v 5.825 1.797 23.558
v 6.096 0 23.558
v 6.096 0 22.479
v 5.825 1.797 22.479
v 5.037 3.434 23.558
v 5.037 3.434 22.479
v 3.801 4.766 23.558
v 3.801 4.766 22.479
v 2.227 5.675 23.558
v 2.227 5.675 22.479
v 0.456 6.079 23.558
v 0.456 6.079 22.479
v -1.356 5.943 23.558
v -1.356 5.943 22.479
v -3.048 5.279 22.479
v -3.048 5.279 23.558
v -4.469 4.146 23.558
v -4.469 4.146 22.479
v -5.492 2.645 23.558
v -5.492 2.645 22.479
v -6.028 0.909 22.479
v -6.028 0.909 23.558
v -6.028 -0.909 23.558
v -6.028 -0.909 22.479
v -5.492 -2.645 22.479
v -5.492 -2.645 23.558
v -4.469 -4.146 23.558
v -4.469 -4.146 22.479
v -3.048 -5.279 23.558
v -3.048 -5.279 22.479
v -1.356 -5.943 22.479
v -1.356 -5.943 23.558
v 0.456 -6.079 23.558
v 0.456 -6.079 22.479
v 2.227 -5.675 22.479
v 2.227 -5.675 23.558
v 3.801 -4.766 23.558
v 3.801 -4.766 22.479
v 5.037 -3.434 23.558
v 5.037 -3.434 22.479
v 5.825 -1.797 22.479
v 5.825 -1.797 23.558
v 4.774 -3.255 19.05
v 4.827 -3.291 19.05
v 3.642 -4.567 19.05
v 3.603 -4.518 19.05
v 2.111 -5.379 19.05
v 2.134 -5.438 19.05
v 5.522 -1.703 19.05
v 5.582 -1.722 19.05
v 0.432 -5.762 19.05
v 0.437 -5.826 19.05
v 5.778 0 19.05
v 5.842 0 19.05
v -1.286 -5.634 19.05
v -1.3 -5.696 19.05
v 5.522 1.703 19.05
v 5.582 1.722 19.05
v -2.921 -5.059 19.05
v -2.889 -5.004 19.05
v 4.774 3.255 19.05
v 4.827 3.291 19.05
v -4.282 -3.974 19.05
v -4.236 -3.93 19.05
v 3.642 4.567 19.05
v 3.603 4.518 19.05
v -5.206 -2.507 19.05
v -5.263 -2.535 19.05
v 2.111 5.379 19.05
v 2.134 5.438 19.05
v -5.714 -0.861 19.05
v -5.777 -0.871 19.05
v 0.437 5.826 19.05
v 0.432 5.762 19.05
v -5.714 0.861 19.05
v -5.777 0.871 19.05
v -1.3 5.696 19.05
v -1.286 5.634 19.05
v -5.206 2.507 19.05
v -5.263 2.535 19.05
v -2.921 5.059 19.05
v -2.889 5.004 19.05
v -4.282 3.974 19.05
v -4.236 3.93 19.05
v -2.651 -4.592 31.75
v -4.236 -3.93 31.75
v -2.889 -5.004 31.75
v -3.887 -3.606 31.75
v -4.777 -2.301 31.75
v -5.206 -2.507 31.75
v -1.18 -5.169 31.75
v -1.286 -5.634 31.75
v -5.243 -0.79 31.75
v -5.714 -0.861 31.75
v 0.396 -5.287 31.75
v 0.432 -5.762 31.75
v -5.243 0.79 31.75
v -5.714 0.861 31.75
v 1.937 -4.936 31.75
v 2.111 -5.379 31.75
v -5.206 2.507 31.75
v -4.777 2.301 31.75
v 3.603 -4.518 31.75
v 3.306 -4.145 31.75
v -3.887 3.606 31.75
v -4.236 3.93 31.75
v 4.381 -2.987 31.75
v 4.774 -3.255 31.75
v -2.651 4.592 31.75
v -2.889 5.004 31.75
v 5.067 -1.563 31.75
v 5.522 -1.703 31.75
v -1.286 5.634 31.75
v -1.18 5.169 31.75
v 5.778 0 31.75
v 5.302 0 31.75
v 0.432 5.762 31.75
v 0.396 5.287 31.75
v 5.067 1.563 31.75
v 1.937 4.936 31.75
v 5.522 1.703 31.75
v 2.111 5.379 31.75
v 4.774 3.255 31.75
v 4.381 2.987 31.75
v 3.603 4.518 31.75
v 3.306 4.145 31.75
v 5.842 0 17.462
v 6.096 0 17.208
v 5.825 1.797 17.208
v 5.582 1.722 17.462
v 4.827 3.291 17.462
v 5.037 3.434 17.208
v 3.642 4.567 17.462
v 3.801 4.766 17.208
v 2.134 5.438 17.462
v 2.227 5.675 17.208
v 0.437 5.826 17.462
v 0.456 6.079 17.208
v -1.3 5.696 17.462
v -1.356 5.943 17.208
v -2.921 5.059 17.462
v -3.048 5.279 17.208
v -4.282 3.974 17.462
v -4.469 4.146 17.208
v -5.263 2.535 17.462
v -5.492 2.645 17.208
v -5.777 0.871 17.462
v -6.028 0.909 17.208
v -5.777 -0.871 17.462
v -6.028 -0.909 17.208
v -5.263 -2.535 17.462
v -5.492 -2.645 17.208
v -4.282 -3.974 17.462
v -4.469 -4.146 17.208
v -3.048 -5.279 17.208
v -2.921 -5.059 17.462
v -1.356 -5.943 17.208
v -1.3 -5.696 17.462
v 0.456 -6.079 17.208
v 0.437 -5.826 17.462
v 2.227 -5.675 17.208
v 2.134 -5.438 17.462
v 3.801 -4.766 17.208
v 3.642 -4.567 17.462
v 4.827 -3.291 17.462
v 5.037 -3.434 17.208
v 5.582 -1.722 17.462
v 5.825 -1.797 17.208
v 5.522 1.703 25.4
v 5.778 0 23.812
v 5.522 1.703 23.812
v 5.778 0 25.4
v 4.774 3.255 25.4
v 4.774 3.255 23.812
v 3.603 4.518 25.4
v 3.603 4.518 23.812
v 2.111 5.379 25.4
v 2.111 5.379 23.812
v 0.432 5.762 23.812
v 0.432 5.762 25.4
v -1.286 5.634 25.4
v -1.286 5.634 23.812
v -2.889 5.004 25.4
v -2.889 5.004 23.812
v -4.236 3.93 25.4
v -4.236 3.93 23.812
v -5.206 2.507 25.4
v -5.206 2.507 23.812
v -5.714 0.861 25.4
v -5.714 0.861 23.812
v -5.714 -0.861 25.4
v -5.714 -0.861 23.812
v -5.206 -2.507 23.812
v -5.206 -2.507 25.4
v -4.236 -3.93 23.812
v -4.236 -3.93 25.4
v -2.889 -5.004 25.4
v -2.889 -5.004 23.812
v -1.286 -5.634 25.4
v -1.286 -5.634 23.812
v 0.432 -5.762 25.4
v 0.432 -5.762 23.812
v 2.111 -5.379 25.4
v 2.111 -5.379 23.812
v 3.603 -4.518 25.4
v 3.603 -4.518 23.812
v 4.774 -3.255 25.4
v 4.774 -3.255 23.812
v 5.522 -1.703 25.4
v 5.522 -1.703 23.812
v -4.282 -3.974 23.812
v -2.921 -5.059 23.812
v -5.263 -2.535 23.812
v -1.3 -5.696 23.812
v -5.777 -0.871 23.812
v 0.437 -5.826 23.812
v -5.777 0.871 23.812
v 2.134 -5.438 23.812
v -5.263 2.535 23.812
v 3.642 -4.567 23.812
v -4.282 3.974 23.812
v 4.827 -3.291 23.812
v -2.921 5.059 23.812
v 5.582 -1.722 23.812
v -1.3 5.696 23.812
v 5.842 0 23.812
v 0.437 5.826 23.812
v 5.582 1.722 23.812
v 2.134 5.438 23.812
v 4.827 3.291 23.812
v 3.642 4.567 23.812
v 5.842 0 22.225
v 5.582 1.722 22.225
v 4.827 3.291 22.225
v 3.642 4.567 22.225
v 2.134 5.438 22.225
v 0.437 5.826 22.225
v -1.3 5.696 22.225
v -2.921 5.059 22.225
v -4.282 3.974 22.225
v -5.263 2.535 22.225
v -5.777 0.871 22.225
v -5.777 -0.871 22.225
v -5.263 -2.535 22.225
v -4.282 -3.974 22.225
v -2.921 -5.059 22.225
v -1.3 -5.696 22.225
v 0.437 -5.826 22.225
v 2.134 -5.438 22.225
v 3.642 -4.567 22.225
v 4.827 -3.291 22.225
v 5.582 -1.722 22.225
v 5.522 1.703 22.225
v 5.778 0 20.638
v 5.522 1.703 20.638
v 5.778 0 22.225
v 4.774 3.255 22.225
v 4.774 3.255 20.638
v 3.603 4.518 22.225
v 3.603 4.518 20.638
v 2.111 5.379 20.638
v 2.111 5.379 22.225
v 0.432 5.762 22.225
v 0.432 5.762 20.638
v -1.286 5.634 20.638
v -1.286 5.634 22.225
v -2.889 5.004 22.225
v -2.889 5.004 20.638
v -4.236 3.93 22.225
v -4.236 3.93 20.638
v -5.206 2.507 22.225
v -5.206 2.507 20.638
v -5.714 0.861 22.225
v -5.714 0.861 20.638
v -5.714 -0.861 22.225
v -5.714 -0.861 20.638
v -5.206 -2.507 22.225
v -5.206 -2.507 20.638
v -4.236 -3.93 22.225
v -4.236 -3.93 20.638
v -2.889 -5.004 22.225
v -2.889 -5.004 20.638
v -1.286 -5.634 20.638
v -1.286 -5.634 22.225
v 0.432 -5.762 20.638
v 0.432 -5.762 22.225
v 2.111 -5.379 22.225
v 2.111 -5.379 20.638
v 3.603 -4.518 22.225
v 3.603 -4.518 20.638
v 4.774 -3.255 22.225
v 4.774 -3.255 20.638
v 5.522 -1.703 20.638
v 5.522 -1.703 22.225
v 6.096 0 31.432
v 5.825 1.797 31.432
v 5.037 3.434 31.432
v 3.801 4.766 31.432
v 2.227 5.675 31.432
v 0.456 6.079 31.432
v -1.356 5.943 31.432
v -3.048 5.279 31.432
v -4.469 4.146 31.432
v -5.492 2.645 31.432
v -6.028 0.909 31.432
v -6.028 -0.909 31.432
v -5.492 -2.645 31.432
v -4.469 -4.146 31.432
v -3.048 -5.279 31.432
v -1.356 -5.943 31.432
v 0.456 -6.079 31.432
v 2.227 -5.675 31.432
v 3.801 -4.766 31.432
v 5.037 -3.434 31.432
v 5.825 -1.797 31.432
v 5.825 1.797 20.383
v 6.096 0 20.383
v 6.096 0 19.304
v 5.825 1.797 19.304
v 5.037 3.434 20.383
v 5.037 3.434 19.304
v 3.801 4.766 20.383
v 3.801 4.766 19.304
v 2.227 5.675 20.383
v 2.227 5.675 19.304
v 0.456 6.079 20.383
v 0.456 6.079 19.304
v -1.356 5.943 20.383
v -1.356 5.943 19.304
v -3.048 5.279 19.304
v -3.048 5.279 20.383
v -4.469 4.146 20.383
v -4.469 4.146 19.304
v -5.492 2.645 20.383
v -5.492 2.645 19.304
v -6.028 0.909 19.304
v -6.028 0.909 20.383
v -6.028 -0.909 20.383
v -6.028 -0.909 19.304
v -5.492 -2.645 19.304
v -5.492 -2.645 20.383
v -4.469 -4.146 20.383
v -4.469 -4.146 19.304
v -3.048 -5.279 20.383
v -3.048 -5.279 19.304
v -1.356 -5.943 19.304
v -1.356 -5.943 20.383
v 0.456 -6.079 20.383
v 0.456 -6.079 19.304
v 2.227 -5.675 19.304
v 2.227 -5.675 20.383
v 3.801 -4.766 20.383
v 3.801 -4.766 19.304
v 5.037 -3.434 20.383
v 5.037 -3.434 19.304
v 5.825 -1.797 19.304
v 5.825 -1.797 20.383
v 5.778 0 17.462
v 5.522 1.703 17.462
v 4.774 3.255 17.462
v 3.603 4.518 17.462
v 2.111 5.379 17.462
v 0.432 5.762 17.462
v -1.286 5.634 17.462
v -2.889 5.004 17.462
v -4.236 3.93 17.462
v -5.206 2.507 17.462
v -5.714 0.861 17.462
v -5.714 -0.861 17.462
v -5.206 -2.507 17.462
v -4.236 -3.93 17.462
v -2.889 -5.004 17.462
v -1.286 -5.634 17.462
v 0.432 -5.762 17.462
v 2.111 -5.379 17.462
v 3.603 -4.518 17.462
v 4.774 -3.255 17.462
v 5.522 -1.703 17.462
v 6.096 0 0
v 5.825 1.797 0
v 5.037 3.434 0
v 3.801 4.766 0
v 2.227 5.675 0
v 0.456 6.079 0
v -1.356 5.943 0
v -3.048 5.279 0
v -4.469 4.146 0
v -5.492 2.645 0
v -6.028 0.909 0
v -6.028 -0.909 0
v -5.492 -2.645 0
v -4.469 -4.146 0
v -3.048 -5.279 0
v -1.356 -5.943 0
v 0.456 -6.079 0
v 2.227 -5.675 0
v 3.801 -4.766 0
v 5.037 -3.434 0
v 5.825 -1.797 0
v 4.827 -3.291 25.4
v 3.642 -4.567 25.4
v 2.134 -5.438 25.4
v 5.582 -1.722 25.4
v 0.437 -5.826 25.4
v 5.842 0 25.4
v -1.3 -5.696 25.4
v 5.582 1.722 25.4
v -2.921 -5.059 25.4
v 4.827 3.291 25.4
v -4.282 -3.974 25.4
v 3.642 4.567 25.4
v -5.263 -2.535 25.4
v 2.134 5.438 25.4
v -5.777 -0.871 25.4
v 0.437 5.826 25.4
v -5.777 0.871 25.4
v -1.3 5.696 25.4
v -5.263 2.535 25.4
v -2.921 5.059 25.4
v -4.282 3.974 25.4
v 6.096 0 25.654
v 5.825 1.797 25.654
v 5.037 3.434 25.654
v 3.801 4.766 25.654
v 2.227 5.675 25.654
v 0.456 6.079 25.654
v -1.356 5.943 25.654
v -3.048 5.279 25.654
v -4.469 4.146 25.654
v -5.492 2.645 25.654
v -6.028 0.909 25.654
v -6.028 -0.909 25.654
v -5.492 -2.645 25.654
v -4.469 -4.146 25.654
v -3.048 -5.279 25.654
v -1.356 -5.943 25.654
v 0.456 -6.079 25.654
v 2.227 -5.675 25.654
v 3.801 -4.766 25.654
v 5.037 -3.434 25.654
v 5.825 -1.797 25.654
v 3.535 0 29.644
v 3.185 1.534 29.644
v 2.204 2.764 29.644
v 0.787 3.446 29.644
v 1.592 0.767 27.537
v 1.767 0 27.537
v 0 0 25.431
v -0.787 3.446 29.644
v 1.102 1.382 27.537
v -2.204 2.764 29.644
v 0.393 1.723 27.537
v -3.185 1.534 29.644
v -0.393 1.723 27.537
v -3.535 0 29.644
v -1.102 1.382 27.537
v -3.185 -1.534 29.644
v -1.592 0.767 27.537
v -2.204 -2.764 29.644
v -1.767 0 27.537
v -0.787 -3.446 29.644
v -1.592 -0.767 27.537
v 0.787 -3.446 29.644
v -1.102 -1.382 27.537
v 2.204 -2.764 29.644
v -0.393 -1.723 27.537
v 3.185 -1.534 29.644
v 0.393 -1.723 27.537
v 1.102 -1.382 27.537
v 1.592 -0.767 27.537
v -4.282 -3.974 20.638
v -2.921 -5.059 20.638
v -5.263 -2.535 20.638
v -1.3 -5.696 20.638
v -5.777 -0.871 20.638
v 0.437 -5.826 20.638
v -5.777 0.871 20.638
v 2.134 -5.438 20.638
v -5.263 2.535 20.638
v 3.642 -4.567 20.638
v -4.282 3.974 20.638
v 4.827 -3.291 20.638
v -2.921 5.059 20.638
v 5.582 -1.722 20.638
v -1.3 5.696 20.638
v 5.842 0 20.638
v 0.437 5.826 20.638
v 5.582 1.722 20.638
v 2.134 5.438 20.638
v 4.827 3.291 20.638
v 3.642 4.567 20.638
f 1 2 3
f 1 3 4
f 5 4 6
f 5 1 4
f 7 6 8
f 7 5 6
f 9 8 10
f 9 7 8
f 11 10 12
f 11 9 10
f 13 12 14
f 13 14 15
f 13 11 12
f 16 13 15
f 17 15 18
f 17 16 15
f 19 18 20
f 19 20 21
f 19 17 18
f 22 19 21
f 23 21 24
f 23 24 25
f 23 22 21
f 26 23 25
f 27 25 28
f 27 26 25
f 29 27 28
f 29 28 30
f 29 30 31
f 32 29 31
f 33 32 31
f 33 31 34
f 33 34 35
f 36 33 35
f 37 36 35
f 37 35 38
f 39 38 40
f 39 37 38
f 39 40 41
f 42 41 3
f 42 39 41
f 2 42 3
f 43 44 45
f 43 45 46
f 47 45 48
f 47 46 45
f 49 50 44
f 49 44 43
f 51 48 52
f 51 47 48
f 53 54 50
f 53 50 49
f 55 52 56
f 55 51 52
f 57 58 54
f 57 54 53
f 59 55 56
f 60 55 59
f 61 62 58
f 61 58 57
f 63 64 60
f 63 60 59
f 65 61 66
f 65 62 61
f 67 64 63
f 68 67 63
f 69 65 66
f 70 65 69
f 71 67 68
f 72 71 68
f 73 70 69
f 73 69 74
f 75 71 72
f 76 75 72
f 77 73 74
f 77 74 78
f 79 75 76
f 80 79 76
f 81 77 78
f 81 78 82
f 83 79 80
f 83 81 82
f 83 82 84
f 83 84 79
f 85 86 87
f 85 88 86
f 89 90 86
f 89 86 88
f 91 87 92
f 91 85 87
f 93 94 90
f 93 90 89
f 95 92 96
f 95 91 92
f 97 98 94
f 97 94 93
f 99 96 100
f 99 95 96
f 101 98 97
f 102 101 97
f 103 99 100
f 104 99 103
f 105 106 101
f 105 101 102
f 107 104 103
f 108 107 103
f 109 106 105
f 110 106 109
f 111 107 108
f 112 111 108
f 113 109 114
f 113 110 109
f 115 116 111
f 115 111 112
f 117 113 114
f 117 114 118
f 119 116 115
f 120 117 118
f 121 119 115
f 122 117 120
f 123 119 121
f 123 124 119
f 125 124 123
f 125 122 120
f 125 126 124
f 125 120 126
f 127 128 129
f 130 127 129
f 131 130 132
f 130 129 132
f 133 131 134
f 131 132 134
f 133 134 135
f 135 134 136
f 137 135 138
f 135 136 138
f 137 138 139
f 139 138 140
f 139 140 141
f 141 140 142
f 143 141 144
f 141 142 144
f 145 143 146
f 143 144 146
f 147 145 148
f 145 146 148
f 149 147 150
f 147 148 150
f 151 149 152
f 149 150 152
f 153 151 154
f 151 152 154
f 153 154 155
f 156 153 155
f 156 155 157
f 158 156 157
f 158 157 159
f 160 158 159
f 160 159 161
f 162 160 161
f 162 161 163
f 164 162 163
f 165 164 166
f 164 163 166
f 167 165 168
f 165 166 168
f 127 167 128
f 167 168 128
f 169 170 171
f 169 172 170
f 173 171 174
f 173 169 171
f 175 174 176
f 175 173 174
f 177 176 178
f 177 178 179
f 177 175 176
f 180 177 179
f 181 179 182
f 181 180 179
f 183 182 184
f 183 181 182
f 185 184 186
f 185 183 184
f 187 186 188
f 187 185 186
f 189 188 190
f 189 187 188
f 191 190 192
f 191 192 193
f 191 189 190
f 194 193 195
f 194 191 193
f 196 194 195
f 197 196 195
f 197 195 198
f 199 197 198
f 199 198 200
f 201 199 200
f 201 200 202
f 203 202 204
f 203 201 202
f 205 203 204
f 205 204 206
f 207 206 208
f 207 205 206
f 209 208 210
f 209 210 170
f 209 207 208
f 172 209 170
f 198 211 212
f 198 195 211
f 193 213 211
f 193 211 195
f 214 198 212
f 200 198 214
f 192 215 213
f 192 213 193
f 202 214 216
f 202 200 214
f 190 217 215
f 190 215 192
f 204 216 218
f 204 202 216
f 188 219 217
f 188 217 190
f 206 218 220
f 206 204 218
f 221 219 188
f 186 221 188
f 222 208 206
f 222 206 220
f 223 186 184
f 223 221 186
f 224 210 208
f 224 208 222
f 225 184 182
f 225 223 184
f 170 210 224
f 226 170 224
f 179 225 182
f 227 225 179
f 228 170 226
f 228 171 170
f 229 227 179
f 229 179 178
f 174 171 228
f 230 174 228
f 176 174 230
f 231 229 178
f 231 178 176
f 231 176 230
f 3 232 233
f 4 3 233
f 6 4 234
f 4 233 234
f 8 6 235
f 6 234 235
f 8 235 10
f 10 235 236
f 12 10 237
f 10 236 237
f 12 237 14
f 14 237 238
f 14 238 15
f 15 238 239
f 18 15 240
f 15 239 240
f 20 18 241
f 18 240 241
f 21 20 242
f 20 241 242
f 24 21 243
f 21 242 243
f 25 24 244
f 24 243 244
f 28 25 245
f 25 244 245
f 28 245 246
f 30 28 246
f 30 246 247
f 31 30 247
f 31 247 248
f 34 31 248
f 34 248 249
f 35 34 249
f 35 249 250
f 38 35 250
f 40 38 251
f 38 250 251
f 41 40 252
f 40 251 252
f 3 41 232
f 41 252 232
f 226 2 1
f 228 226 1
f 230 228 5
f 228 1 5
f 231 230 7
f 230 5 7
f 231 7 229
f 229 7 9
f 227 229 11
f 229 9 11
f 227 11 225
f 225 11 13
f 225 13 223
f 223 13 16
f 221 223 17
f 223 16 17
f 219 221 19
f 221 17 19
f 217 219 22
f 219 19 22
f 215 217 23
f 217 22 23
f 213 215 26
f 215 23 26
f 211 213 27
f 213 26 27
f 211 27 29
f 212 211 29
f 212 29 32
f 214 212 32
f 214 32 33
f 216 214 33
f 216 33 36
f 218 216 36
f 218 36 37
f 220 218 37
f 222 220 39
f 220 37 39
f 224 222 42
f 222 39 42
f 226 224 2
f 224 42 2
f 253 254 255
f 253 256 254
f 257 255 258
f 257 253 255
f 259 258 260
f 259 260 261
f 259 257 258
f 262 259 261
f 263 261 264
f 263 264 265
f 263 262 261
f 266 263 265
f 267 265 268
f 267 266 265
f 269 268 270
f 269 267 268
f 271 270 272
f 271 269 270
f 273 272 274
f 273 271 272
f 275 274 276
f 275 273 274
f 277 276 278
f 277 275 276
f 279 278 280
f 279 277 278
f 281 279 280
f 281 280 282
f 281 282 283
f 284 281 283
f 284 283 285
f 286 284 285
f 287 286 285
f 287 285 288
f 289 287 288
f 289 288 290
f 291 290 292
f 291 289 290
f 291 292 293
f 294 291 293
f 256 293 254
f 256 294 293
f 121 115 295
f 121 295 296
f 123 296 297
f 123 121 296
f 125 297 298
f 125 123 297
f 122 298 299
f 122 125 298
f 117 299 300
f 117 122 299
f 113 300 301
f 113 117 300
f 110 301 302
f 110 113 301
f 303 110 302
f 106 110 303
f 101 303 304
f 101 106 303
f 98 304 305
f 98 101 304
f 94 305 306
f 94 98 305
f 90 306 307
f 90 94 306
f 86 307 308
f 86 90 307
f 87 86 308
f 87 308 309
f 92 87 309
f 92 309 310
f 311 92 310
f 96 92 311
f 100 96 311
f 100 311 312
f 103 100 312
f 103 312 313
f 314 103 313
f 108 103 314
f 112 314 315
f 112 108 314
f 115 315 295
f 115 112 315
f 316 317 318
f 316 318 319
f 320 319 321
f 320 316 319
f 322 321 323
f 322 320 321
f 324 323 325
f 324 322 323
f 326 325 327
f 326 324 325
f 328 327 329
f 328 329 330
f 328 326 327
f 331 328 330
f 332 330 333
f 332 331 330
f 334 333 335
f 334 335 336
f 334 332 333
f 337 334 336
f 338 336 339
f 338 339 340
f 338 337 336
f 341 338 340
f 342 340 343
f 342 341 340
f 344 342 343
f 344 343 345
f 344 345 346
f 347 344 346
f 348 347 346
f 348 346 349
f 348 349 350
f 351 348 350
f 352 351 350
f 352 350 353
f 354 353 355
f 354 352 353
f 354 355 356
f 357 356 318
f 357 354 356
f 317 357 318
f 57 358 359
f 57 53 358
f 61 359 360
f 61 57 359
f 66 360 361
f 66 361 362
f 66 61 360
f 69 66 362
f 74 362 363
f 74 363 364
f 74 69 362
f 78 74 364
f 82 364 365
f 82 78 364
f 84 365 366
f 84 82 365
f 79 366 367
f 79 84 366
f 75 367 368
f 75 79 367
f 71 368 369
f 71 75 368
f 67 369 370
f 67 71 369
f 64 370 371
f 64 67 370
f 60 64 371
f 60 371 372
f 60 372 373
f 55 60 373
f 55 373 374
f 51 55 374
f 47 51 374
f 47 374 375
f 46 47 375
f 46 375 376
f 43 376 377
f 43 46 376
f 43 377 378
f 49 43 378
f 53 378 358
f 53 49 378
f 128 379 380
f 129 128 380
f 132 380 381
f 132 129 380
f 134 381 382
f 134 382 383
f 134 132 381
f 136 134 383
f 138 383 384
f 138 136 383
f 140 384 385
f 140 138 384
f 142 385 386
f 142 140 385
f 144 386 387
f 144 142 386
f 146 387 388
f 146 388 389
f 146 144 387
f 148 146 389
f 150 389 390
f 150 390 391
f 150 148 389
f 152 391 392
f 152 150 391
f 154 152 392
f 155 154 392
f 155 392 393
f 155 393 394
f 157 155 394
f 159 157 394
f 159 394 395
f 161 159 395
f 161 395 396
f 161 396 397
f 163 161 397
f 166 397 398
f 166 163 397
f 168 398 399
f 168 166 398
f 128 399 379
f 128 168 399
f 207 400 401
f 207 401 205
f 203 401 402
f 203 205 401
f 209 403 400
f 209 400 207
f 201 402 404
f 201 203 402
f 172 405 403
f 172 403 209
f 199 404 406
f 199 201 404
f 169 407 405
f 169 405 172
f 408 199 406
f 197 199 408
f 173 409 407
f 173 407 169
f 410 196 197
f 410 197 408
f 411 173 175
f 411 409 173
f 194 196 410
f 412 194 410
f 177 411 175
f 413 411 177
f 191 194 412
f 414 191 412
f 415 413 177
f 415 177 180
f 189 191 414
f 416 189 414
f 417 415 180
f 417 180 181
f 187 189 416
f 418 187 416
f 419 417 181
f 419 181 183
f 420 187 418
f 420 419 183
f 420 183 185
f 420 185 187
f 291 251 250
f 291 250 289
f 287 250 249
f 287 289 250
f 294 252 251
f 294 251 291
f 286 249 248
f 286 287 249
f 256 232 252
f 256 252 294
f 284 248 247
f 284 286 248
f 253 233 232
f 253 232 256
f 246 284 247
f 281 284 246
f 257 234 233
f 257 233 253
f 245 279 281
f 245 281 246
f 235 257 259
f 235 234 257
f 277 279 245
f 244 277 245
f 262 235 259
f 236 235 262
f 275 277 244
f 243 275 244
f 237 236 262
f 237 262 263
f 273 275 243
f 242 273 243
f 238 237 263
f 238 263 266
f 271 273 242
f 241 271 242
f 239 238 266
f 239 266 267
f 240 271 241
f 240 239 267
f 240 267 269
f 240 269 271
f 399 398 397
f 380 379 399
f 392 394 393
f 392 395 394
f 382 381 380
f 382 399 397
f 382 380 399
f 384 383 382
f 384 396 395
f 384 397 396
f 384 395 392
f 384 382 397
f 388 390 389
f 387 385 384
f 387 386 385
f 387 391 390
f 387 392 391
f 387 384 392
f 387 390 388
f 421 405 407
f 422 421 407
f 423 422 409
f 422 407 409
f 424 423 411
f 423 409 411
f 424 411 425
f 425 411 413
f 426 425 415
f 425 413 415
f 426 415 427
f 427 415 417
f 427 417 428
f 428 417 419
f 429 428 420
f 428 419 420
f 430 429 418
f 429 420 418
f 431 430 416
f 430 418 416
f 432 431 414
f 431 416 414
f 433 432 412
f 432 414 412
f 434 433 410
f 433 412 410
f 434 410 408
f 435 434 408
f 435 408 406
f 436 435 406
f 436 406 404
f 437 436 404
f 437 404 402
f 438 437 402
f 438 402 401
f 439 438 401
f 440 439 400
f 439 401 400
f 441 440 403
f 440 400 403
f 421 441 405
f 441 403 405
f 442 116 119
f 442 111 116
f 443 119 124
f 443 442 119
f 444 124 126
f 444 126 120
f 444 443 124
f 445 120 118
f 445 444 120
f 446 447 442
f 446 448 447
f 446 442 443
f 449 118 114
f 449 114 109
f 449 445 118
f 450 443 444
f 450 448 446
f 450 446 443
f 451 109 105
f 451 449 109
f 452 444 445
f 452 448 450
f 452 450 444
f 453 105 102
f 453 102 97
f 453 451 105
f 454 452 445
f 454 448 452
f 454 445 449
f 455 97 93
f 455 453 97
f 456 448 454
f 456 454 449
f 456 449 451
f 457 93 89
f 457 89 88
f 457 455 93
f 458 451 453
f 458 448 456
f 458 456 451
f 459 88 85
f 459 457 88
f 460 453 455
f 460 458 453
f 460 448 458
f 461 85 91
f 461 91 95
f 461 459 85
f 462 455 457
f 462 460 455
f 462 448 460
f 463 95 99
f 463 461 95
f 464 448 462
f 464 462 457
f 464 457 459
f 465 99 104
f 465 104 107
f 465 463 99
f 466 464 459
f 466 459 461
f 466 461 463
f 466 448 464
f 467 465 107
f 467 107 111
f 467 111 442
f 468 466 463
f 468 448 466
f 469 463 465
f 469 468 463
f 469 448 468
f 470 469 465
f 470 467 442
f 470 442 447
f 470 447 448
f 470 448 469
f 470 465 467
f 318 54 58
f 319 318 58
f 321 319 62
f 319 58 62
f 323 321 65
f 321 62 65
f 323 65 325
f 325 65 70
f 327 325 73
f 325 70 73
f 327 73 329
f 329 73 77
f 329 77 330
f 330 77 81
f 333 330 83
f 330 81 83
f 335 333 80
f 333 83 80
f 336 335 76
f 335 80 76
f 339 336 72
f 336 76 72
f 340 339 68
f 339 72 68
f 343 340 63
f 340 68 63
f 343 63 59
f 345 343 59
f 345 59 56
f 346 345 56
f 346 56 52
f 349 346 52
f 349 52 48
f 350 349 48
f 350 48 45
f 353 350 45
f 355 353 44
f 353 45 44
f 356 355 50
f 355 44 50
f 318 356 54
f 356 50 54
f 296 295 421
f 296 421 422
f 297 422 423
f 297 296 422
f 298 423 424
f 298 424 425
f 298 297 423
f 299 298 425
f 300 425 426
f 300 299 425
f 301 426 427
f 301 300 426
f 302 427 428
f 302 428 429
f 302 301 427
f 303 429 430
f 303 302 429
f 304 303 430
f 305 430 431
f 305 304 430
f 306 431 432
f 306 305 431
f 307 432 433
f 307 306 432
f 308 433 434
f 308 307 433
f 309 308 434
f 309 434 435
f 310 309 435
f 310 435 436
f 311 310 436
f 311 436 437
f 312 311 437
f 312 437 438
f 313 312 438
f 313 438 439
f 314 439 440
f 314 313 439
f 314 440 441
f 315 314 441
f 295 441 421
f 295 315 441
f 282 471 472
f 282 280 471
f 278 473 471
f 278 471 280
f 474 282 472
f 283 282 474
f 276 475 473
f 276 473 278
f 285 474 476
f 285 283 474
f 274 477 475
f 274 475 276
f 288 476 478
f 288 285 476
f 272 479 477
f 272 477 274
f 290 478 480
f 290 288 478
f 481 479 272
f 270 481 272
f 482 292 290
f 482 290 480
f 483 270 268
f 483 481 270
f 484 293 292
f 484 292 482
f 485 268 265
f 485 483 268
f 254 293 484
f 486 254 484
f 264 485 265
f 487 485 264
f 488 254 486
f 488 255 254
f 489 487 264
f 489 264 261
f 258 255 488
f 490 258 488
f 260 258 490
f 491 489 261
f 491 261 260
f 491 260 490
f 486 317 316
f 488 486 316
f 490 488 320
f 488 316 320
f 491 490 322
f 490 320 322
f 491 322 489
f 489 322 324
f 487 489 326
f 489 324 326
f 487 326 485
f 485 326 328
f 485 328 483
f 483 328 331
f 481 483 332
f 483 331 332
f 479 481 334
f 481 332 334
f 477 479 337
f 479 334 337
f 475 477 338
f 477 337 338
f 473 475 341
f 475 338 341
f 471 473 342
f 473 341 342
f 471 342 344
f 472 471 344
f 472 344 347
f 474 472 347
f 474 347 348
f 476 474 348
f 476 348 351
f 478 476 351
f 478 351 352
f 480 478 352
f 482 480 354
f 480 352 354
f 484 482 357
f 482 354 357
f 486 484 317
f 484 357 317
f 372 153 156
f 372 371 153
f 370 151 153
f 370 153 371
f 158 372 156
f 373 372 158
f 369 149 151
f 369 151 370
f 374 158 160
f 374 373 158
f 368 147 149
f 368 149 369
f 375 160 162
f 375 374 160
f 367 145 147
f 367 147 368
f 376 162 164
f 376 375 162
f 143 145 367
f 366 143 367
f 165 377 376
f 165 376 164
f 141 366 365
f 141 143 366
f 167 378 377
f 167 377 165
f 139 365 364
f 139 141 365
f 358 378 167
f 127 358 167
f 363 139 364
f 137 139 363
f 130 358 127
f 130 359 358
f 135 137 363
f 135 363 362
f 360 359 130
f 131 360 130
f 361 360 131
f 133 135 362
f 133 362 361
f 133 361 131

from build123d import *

# Parameters (mm, degrees)
F2_SIZE = 0.3175
F3_SIZE = 0.254


with BuildPart() as f1:
    # F0 (on Front) → F1 (revolve)
    with BuildSketch(Plane.XZ):
        Polygon((6.096, 25.4), (6.096, 31.75), (5.30225, 31.75), (0, 25.431025), (0, 0), (6.096, 0), (6.096, 17.4625), (5.7785, 17.4625), (5.7785, 19.05), (6.096, 19.05), (6.096, 20.6375), (5.7785, 20.6375), (5.7785, 22.225), (6.096, 22.225), (6.096, 23.8125), (5.7785, 23.8125), (5.7785, 25.4), align=None)
    revolve(axis=Axis((0, 0, 12.715512), (0, 0, 1)))

    # F2
    f2_edges = [f1.edges().sort_by_distance(p)[0] for p in [
        (-6.096, 0, 31.75),
    ]]
    chamfer(f2_edges, length=F2_SIZE)

    # F3
    f3_edges = [f1.edges().sort_by_distance(p)[0] for p in [
        (-6.096, 0, 25.4),
        (-6.096, 0, 23.8125),
        (-6.096, 0, 22.225),
        (-6.096, 0, 20.6375),
        (-6.096, 0, 19.05),
        (-6.096, 0, 17.4625),
    ]]
    chamfer(f3_edges, length=F3_SIZE)


solid = f1.part
